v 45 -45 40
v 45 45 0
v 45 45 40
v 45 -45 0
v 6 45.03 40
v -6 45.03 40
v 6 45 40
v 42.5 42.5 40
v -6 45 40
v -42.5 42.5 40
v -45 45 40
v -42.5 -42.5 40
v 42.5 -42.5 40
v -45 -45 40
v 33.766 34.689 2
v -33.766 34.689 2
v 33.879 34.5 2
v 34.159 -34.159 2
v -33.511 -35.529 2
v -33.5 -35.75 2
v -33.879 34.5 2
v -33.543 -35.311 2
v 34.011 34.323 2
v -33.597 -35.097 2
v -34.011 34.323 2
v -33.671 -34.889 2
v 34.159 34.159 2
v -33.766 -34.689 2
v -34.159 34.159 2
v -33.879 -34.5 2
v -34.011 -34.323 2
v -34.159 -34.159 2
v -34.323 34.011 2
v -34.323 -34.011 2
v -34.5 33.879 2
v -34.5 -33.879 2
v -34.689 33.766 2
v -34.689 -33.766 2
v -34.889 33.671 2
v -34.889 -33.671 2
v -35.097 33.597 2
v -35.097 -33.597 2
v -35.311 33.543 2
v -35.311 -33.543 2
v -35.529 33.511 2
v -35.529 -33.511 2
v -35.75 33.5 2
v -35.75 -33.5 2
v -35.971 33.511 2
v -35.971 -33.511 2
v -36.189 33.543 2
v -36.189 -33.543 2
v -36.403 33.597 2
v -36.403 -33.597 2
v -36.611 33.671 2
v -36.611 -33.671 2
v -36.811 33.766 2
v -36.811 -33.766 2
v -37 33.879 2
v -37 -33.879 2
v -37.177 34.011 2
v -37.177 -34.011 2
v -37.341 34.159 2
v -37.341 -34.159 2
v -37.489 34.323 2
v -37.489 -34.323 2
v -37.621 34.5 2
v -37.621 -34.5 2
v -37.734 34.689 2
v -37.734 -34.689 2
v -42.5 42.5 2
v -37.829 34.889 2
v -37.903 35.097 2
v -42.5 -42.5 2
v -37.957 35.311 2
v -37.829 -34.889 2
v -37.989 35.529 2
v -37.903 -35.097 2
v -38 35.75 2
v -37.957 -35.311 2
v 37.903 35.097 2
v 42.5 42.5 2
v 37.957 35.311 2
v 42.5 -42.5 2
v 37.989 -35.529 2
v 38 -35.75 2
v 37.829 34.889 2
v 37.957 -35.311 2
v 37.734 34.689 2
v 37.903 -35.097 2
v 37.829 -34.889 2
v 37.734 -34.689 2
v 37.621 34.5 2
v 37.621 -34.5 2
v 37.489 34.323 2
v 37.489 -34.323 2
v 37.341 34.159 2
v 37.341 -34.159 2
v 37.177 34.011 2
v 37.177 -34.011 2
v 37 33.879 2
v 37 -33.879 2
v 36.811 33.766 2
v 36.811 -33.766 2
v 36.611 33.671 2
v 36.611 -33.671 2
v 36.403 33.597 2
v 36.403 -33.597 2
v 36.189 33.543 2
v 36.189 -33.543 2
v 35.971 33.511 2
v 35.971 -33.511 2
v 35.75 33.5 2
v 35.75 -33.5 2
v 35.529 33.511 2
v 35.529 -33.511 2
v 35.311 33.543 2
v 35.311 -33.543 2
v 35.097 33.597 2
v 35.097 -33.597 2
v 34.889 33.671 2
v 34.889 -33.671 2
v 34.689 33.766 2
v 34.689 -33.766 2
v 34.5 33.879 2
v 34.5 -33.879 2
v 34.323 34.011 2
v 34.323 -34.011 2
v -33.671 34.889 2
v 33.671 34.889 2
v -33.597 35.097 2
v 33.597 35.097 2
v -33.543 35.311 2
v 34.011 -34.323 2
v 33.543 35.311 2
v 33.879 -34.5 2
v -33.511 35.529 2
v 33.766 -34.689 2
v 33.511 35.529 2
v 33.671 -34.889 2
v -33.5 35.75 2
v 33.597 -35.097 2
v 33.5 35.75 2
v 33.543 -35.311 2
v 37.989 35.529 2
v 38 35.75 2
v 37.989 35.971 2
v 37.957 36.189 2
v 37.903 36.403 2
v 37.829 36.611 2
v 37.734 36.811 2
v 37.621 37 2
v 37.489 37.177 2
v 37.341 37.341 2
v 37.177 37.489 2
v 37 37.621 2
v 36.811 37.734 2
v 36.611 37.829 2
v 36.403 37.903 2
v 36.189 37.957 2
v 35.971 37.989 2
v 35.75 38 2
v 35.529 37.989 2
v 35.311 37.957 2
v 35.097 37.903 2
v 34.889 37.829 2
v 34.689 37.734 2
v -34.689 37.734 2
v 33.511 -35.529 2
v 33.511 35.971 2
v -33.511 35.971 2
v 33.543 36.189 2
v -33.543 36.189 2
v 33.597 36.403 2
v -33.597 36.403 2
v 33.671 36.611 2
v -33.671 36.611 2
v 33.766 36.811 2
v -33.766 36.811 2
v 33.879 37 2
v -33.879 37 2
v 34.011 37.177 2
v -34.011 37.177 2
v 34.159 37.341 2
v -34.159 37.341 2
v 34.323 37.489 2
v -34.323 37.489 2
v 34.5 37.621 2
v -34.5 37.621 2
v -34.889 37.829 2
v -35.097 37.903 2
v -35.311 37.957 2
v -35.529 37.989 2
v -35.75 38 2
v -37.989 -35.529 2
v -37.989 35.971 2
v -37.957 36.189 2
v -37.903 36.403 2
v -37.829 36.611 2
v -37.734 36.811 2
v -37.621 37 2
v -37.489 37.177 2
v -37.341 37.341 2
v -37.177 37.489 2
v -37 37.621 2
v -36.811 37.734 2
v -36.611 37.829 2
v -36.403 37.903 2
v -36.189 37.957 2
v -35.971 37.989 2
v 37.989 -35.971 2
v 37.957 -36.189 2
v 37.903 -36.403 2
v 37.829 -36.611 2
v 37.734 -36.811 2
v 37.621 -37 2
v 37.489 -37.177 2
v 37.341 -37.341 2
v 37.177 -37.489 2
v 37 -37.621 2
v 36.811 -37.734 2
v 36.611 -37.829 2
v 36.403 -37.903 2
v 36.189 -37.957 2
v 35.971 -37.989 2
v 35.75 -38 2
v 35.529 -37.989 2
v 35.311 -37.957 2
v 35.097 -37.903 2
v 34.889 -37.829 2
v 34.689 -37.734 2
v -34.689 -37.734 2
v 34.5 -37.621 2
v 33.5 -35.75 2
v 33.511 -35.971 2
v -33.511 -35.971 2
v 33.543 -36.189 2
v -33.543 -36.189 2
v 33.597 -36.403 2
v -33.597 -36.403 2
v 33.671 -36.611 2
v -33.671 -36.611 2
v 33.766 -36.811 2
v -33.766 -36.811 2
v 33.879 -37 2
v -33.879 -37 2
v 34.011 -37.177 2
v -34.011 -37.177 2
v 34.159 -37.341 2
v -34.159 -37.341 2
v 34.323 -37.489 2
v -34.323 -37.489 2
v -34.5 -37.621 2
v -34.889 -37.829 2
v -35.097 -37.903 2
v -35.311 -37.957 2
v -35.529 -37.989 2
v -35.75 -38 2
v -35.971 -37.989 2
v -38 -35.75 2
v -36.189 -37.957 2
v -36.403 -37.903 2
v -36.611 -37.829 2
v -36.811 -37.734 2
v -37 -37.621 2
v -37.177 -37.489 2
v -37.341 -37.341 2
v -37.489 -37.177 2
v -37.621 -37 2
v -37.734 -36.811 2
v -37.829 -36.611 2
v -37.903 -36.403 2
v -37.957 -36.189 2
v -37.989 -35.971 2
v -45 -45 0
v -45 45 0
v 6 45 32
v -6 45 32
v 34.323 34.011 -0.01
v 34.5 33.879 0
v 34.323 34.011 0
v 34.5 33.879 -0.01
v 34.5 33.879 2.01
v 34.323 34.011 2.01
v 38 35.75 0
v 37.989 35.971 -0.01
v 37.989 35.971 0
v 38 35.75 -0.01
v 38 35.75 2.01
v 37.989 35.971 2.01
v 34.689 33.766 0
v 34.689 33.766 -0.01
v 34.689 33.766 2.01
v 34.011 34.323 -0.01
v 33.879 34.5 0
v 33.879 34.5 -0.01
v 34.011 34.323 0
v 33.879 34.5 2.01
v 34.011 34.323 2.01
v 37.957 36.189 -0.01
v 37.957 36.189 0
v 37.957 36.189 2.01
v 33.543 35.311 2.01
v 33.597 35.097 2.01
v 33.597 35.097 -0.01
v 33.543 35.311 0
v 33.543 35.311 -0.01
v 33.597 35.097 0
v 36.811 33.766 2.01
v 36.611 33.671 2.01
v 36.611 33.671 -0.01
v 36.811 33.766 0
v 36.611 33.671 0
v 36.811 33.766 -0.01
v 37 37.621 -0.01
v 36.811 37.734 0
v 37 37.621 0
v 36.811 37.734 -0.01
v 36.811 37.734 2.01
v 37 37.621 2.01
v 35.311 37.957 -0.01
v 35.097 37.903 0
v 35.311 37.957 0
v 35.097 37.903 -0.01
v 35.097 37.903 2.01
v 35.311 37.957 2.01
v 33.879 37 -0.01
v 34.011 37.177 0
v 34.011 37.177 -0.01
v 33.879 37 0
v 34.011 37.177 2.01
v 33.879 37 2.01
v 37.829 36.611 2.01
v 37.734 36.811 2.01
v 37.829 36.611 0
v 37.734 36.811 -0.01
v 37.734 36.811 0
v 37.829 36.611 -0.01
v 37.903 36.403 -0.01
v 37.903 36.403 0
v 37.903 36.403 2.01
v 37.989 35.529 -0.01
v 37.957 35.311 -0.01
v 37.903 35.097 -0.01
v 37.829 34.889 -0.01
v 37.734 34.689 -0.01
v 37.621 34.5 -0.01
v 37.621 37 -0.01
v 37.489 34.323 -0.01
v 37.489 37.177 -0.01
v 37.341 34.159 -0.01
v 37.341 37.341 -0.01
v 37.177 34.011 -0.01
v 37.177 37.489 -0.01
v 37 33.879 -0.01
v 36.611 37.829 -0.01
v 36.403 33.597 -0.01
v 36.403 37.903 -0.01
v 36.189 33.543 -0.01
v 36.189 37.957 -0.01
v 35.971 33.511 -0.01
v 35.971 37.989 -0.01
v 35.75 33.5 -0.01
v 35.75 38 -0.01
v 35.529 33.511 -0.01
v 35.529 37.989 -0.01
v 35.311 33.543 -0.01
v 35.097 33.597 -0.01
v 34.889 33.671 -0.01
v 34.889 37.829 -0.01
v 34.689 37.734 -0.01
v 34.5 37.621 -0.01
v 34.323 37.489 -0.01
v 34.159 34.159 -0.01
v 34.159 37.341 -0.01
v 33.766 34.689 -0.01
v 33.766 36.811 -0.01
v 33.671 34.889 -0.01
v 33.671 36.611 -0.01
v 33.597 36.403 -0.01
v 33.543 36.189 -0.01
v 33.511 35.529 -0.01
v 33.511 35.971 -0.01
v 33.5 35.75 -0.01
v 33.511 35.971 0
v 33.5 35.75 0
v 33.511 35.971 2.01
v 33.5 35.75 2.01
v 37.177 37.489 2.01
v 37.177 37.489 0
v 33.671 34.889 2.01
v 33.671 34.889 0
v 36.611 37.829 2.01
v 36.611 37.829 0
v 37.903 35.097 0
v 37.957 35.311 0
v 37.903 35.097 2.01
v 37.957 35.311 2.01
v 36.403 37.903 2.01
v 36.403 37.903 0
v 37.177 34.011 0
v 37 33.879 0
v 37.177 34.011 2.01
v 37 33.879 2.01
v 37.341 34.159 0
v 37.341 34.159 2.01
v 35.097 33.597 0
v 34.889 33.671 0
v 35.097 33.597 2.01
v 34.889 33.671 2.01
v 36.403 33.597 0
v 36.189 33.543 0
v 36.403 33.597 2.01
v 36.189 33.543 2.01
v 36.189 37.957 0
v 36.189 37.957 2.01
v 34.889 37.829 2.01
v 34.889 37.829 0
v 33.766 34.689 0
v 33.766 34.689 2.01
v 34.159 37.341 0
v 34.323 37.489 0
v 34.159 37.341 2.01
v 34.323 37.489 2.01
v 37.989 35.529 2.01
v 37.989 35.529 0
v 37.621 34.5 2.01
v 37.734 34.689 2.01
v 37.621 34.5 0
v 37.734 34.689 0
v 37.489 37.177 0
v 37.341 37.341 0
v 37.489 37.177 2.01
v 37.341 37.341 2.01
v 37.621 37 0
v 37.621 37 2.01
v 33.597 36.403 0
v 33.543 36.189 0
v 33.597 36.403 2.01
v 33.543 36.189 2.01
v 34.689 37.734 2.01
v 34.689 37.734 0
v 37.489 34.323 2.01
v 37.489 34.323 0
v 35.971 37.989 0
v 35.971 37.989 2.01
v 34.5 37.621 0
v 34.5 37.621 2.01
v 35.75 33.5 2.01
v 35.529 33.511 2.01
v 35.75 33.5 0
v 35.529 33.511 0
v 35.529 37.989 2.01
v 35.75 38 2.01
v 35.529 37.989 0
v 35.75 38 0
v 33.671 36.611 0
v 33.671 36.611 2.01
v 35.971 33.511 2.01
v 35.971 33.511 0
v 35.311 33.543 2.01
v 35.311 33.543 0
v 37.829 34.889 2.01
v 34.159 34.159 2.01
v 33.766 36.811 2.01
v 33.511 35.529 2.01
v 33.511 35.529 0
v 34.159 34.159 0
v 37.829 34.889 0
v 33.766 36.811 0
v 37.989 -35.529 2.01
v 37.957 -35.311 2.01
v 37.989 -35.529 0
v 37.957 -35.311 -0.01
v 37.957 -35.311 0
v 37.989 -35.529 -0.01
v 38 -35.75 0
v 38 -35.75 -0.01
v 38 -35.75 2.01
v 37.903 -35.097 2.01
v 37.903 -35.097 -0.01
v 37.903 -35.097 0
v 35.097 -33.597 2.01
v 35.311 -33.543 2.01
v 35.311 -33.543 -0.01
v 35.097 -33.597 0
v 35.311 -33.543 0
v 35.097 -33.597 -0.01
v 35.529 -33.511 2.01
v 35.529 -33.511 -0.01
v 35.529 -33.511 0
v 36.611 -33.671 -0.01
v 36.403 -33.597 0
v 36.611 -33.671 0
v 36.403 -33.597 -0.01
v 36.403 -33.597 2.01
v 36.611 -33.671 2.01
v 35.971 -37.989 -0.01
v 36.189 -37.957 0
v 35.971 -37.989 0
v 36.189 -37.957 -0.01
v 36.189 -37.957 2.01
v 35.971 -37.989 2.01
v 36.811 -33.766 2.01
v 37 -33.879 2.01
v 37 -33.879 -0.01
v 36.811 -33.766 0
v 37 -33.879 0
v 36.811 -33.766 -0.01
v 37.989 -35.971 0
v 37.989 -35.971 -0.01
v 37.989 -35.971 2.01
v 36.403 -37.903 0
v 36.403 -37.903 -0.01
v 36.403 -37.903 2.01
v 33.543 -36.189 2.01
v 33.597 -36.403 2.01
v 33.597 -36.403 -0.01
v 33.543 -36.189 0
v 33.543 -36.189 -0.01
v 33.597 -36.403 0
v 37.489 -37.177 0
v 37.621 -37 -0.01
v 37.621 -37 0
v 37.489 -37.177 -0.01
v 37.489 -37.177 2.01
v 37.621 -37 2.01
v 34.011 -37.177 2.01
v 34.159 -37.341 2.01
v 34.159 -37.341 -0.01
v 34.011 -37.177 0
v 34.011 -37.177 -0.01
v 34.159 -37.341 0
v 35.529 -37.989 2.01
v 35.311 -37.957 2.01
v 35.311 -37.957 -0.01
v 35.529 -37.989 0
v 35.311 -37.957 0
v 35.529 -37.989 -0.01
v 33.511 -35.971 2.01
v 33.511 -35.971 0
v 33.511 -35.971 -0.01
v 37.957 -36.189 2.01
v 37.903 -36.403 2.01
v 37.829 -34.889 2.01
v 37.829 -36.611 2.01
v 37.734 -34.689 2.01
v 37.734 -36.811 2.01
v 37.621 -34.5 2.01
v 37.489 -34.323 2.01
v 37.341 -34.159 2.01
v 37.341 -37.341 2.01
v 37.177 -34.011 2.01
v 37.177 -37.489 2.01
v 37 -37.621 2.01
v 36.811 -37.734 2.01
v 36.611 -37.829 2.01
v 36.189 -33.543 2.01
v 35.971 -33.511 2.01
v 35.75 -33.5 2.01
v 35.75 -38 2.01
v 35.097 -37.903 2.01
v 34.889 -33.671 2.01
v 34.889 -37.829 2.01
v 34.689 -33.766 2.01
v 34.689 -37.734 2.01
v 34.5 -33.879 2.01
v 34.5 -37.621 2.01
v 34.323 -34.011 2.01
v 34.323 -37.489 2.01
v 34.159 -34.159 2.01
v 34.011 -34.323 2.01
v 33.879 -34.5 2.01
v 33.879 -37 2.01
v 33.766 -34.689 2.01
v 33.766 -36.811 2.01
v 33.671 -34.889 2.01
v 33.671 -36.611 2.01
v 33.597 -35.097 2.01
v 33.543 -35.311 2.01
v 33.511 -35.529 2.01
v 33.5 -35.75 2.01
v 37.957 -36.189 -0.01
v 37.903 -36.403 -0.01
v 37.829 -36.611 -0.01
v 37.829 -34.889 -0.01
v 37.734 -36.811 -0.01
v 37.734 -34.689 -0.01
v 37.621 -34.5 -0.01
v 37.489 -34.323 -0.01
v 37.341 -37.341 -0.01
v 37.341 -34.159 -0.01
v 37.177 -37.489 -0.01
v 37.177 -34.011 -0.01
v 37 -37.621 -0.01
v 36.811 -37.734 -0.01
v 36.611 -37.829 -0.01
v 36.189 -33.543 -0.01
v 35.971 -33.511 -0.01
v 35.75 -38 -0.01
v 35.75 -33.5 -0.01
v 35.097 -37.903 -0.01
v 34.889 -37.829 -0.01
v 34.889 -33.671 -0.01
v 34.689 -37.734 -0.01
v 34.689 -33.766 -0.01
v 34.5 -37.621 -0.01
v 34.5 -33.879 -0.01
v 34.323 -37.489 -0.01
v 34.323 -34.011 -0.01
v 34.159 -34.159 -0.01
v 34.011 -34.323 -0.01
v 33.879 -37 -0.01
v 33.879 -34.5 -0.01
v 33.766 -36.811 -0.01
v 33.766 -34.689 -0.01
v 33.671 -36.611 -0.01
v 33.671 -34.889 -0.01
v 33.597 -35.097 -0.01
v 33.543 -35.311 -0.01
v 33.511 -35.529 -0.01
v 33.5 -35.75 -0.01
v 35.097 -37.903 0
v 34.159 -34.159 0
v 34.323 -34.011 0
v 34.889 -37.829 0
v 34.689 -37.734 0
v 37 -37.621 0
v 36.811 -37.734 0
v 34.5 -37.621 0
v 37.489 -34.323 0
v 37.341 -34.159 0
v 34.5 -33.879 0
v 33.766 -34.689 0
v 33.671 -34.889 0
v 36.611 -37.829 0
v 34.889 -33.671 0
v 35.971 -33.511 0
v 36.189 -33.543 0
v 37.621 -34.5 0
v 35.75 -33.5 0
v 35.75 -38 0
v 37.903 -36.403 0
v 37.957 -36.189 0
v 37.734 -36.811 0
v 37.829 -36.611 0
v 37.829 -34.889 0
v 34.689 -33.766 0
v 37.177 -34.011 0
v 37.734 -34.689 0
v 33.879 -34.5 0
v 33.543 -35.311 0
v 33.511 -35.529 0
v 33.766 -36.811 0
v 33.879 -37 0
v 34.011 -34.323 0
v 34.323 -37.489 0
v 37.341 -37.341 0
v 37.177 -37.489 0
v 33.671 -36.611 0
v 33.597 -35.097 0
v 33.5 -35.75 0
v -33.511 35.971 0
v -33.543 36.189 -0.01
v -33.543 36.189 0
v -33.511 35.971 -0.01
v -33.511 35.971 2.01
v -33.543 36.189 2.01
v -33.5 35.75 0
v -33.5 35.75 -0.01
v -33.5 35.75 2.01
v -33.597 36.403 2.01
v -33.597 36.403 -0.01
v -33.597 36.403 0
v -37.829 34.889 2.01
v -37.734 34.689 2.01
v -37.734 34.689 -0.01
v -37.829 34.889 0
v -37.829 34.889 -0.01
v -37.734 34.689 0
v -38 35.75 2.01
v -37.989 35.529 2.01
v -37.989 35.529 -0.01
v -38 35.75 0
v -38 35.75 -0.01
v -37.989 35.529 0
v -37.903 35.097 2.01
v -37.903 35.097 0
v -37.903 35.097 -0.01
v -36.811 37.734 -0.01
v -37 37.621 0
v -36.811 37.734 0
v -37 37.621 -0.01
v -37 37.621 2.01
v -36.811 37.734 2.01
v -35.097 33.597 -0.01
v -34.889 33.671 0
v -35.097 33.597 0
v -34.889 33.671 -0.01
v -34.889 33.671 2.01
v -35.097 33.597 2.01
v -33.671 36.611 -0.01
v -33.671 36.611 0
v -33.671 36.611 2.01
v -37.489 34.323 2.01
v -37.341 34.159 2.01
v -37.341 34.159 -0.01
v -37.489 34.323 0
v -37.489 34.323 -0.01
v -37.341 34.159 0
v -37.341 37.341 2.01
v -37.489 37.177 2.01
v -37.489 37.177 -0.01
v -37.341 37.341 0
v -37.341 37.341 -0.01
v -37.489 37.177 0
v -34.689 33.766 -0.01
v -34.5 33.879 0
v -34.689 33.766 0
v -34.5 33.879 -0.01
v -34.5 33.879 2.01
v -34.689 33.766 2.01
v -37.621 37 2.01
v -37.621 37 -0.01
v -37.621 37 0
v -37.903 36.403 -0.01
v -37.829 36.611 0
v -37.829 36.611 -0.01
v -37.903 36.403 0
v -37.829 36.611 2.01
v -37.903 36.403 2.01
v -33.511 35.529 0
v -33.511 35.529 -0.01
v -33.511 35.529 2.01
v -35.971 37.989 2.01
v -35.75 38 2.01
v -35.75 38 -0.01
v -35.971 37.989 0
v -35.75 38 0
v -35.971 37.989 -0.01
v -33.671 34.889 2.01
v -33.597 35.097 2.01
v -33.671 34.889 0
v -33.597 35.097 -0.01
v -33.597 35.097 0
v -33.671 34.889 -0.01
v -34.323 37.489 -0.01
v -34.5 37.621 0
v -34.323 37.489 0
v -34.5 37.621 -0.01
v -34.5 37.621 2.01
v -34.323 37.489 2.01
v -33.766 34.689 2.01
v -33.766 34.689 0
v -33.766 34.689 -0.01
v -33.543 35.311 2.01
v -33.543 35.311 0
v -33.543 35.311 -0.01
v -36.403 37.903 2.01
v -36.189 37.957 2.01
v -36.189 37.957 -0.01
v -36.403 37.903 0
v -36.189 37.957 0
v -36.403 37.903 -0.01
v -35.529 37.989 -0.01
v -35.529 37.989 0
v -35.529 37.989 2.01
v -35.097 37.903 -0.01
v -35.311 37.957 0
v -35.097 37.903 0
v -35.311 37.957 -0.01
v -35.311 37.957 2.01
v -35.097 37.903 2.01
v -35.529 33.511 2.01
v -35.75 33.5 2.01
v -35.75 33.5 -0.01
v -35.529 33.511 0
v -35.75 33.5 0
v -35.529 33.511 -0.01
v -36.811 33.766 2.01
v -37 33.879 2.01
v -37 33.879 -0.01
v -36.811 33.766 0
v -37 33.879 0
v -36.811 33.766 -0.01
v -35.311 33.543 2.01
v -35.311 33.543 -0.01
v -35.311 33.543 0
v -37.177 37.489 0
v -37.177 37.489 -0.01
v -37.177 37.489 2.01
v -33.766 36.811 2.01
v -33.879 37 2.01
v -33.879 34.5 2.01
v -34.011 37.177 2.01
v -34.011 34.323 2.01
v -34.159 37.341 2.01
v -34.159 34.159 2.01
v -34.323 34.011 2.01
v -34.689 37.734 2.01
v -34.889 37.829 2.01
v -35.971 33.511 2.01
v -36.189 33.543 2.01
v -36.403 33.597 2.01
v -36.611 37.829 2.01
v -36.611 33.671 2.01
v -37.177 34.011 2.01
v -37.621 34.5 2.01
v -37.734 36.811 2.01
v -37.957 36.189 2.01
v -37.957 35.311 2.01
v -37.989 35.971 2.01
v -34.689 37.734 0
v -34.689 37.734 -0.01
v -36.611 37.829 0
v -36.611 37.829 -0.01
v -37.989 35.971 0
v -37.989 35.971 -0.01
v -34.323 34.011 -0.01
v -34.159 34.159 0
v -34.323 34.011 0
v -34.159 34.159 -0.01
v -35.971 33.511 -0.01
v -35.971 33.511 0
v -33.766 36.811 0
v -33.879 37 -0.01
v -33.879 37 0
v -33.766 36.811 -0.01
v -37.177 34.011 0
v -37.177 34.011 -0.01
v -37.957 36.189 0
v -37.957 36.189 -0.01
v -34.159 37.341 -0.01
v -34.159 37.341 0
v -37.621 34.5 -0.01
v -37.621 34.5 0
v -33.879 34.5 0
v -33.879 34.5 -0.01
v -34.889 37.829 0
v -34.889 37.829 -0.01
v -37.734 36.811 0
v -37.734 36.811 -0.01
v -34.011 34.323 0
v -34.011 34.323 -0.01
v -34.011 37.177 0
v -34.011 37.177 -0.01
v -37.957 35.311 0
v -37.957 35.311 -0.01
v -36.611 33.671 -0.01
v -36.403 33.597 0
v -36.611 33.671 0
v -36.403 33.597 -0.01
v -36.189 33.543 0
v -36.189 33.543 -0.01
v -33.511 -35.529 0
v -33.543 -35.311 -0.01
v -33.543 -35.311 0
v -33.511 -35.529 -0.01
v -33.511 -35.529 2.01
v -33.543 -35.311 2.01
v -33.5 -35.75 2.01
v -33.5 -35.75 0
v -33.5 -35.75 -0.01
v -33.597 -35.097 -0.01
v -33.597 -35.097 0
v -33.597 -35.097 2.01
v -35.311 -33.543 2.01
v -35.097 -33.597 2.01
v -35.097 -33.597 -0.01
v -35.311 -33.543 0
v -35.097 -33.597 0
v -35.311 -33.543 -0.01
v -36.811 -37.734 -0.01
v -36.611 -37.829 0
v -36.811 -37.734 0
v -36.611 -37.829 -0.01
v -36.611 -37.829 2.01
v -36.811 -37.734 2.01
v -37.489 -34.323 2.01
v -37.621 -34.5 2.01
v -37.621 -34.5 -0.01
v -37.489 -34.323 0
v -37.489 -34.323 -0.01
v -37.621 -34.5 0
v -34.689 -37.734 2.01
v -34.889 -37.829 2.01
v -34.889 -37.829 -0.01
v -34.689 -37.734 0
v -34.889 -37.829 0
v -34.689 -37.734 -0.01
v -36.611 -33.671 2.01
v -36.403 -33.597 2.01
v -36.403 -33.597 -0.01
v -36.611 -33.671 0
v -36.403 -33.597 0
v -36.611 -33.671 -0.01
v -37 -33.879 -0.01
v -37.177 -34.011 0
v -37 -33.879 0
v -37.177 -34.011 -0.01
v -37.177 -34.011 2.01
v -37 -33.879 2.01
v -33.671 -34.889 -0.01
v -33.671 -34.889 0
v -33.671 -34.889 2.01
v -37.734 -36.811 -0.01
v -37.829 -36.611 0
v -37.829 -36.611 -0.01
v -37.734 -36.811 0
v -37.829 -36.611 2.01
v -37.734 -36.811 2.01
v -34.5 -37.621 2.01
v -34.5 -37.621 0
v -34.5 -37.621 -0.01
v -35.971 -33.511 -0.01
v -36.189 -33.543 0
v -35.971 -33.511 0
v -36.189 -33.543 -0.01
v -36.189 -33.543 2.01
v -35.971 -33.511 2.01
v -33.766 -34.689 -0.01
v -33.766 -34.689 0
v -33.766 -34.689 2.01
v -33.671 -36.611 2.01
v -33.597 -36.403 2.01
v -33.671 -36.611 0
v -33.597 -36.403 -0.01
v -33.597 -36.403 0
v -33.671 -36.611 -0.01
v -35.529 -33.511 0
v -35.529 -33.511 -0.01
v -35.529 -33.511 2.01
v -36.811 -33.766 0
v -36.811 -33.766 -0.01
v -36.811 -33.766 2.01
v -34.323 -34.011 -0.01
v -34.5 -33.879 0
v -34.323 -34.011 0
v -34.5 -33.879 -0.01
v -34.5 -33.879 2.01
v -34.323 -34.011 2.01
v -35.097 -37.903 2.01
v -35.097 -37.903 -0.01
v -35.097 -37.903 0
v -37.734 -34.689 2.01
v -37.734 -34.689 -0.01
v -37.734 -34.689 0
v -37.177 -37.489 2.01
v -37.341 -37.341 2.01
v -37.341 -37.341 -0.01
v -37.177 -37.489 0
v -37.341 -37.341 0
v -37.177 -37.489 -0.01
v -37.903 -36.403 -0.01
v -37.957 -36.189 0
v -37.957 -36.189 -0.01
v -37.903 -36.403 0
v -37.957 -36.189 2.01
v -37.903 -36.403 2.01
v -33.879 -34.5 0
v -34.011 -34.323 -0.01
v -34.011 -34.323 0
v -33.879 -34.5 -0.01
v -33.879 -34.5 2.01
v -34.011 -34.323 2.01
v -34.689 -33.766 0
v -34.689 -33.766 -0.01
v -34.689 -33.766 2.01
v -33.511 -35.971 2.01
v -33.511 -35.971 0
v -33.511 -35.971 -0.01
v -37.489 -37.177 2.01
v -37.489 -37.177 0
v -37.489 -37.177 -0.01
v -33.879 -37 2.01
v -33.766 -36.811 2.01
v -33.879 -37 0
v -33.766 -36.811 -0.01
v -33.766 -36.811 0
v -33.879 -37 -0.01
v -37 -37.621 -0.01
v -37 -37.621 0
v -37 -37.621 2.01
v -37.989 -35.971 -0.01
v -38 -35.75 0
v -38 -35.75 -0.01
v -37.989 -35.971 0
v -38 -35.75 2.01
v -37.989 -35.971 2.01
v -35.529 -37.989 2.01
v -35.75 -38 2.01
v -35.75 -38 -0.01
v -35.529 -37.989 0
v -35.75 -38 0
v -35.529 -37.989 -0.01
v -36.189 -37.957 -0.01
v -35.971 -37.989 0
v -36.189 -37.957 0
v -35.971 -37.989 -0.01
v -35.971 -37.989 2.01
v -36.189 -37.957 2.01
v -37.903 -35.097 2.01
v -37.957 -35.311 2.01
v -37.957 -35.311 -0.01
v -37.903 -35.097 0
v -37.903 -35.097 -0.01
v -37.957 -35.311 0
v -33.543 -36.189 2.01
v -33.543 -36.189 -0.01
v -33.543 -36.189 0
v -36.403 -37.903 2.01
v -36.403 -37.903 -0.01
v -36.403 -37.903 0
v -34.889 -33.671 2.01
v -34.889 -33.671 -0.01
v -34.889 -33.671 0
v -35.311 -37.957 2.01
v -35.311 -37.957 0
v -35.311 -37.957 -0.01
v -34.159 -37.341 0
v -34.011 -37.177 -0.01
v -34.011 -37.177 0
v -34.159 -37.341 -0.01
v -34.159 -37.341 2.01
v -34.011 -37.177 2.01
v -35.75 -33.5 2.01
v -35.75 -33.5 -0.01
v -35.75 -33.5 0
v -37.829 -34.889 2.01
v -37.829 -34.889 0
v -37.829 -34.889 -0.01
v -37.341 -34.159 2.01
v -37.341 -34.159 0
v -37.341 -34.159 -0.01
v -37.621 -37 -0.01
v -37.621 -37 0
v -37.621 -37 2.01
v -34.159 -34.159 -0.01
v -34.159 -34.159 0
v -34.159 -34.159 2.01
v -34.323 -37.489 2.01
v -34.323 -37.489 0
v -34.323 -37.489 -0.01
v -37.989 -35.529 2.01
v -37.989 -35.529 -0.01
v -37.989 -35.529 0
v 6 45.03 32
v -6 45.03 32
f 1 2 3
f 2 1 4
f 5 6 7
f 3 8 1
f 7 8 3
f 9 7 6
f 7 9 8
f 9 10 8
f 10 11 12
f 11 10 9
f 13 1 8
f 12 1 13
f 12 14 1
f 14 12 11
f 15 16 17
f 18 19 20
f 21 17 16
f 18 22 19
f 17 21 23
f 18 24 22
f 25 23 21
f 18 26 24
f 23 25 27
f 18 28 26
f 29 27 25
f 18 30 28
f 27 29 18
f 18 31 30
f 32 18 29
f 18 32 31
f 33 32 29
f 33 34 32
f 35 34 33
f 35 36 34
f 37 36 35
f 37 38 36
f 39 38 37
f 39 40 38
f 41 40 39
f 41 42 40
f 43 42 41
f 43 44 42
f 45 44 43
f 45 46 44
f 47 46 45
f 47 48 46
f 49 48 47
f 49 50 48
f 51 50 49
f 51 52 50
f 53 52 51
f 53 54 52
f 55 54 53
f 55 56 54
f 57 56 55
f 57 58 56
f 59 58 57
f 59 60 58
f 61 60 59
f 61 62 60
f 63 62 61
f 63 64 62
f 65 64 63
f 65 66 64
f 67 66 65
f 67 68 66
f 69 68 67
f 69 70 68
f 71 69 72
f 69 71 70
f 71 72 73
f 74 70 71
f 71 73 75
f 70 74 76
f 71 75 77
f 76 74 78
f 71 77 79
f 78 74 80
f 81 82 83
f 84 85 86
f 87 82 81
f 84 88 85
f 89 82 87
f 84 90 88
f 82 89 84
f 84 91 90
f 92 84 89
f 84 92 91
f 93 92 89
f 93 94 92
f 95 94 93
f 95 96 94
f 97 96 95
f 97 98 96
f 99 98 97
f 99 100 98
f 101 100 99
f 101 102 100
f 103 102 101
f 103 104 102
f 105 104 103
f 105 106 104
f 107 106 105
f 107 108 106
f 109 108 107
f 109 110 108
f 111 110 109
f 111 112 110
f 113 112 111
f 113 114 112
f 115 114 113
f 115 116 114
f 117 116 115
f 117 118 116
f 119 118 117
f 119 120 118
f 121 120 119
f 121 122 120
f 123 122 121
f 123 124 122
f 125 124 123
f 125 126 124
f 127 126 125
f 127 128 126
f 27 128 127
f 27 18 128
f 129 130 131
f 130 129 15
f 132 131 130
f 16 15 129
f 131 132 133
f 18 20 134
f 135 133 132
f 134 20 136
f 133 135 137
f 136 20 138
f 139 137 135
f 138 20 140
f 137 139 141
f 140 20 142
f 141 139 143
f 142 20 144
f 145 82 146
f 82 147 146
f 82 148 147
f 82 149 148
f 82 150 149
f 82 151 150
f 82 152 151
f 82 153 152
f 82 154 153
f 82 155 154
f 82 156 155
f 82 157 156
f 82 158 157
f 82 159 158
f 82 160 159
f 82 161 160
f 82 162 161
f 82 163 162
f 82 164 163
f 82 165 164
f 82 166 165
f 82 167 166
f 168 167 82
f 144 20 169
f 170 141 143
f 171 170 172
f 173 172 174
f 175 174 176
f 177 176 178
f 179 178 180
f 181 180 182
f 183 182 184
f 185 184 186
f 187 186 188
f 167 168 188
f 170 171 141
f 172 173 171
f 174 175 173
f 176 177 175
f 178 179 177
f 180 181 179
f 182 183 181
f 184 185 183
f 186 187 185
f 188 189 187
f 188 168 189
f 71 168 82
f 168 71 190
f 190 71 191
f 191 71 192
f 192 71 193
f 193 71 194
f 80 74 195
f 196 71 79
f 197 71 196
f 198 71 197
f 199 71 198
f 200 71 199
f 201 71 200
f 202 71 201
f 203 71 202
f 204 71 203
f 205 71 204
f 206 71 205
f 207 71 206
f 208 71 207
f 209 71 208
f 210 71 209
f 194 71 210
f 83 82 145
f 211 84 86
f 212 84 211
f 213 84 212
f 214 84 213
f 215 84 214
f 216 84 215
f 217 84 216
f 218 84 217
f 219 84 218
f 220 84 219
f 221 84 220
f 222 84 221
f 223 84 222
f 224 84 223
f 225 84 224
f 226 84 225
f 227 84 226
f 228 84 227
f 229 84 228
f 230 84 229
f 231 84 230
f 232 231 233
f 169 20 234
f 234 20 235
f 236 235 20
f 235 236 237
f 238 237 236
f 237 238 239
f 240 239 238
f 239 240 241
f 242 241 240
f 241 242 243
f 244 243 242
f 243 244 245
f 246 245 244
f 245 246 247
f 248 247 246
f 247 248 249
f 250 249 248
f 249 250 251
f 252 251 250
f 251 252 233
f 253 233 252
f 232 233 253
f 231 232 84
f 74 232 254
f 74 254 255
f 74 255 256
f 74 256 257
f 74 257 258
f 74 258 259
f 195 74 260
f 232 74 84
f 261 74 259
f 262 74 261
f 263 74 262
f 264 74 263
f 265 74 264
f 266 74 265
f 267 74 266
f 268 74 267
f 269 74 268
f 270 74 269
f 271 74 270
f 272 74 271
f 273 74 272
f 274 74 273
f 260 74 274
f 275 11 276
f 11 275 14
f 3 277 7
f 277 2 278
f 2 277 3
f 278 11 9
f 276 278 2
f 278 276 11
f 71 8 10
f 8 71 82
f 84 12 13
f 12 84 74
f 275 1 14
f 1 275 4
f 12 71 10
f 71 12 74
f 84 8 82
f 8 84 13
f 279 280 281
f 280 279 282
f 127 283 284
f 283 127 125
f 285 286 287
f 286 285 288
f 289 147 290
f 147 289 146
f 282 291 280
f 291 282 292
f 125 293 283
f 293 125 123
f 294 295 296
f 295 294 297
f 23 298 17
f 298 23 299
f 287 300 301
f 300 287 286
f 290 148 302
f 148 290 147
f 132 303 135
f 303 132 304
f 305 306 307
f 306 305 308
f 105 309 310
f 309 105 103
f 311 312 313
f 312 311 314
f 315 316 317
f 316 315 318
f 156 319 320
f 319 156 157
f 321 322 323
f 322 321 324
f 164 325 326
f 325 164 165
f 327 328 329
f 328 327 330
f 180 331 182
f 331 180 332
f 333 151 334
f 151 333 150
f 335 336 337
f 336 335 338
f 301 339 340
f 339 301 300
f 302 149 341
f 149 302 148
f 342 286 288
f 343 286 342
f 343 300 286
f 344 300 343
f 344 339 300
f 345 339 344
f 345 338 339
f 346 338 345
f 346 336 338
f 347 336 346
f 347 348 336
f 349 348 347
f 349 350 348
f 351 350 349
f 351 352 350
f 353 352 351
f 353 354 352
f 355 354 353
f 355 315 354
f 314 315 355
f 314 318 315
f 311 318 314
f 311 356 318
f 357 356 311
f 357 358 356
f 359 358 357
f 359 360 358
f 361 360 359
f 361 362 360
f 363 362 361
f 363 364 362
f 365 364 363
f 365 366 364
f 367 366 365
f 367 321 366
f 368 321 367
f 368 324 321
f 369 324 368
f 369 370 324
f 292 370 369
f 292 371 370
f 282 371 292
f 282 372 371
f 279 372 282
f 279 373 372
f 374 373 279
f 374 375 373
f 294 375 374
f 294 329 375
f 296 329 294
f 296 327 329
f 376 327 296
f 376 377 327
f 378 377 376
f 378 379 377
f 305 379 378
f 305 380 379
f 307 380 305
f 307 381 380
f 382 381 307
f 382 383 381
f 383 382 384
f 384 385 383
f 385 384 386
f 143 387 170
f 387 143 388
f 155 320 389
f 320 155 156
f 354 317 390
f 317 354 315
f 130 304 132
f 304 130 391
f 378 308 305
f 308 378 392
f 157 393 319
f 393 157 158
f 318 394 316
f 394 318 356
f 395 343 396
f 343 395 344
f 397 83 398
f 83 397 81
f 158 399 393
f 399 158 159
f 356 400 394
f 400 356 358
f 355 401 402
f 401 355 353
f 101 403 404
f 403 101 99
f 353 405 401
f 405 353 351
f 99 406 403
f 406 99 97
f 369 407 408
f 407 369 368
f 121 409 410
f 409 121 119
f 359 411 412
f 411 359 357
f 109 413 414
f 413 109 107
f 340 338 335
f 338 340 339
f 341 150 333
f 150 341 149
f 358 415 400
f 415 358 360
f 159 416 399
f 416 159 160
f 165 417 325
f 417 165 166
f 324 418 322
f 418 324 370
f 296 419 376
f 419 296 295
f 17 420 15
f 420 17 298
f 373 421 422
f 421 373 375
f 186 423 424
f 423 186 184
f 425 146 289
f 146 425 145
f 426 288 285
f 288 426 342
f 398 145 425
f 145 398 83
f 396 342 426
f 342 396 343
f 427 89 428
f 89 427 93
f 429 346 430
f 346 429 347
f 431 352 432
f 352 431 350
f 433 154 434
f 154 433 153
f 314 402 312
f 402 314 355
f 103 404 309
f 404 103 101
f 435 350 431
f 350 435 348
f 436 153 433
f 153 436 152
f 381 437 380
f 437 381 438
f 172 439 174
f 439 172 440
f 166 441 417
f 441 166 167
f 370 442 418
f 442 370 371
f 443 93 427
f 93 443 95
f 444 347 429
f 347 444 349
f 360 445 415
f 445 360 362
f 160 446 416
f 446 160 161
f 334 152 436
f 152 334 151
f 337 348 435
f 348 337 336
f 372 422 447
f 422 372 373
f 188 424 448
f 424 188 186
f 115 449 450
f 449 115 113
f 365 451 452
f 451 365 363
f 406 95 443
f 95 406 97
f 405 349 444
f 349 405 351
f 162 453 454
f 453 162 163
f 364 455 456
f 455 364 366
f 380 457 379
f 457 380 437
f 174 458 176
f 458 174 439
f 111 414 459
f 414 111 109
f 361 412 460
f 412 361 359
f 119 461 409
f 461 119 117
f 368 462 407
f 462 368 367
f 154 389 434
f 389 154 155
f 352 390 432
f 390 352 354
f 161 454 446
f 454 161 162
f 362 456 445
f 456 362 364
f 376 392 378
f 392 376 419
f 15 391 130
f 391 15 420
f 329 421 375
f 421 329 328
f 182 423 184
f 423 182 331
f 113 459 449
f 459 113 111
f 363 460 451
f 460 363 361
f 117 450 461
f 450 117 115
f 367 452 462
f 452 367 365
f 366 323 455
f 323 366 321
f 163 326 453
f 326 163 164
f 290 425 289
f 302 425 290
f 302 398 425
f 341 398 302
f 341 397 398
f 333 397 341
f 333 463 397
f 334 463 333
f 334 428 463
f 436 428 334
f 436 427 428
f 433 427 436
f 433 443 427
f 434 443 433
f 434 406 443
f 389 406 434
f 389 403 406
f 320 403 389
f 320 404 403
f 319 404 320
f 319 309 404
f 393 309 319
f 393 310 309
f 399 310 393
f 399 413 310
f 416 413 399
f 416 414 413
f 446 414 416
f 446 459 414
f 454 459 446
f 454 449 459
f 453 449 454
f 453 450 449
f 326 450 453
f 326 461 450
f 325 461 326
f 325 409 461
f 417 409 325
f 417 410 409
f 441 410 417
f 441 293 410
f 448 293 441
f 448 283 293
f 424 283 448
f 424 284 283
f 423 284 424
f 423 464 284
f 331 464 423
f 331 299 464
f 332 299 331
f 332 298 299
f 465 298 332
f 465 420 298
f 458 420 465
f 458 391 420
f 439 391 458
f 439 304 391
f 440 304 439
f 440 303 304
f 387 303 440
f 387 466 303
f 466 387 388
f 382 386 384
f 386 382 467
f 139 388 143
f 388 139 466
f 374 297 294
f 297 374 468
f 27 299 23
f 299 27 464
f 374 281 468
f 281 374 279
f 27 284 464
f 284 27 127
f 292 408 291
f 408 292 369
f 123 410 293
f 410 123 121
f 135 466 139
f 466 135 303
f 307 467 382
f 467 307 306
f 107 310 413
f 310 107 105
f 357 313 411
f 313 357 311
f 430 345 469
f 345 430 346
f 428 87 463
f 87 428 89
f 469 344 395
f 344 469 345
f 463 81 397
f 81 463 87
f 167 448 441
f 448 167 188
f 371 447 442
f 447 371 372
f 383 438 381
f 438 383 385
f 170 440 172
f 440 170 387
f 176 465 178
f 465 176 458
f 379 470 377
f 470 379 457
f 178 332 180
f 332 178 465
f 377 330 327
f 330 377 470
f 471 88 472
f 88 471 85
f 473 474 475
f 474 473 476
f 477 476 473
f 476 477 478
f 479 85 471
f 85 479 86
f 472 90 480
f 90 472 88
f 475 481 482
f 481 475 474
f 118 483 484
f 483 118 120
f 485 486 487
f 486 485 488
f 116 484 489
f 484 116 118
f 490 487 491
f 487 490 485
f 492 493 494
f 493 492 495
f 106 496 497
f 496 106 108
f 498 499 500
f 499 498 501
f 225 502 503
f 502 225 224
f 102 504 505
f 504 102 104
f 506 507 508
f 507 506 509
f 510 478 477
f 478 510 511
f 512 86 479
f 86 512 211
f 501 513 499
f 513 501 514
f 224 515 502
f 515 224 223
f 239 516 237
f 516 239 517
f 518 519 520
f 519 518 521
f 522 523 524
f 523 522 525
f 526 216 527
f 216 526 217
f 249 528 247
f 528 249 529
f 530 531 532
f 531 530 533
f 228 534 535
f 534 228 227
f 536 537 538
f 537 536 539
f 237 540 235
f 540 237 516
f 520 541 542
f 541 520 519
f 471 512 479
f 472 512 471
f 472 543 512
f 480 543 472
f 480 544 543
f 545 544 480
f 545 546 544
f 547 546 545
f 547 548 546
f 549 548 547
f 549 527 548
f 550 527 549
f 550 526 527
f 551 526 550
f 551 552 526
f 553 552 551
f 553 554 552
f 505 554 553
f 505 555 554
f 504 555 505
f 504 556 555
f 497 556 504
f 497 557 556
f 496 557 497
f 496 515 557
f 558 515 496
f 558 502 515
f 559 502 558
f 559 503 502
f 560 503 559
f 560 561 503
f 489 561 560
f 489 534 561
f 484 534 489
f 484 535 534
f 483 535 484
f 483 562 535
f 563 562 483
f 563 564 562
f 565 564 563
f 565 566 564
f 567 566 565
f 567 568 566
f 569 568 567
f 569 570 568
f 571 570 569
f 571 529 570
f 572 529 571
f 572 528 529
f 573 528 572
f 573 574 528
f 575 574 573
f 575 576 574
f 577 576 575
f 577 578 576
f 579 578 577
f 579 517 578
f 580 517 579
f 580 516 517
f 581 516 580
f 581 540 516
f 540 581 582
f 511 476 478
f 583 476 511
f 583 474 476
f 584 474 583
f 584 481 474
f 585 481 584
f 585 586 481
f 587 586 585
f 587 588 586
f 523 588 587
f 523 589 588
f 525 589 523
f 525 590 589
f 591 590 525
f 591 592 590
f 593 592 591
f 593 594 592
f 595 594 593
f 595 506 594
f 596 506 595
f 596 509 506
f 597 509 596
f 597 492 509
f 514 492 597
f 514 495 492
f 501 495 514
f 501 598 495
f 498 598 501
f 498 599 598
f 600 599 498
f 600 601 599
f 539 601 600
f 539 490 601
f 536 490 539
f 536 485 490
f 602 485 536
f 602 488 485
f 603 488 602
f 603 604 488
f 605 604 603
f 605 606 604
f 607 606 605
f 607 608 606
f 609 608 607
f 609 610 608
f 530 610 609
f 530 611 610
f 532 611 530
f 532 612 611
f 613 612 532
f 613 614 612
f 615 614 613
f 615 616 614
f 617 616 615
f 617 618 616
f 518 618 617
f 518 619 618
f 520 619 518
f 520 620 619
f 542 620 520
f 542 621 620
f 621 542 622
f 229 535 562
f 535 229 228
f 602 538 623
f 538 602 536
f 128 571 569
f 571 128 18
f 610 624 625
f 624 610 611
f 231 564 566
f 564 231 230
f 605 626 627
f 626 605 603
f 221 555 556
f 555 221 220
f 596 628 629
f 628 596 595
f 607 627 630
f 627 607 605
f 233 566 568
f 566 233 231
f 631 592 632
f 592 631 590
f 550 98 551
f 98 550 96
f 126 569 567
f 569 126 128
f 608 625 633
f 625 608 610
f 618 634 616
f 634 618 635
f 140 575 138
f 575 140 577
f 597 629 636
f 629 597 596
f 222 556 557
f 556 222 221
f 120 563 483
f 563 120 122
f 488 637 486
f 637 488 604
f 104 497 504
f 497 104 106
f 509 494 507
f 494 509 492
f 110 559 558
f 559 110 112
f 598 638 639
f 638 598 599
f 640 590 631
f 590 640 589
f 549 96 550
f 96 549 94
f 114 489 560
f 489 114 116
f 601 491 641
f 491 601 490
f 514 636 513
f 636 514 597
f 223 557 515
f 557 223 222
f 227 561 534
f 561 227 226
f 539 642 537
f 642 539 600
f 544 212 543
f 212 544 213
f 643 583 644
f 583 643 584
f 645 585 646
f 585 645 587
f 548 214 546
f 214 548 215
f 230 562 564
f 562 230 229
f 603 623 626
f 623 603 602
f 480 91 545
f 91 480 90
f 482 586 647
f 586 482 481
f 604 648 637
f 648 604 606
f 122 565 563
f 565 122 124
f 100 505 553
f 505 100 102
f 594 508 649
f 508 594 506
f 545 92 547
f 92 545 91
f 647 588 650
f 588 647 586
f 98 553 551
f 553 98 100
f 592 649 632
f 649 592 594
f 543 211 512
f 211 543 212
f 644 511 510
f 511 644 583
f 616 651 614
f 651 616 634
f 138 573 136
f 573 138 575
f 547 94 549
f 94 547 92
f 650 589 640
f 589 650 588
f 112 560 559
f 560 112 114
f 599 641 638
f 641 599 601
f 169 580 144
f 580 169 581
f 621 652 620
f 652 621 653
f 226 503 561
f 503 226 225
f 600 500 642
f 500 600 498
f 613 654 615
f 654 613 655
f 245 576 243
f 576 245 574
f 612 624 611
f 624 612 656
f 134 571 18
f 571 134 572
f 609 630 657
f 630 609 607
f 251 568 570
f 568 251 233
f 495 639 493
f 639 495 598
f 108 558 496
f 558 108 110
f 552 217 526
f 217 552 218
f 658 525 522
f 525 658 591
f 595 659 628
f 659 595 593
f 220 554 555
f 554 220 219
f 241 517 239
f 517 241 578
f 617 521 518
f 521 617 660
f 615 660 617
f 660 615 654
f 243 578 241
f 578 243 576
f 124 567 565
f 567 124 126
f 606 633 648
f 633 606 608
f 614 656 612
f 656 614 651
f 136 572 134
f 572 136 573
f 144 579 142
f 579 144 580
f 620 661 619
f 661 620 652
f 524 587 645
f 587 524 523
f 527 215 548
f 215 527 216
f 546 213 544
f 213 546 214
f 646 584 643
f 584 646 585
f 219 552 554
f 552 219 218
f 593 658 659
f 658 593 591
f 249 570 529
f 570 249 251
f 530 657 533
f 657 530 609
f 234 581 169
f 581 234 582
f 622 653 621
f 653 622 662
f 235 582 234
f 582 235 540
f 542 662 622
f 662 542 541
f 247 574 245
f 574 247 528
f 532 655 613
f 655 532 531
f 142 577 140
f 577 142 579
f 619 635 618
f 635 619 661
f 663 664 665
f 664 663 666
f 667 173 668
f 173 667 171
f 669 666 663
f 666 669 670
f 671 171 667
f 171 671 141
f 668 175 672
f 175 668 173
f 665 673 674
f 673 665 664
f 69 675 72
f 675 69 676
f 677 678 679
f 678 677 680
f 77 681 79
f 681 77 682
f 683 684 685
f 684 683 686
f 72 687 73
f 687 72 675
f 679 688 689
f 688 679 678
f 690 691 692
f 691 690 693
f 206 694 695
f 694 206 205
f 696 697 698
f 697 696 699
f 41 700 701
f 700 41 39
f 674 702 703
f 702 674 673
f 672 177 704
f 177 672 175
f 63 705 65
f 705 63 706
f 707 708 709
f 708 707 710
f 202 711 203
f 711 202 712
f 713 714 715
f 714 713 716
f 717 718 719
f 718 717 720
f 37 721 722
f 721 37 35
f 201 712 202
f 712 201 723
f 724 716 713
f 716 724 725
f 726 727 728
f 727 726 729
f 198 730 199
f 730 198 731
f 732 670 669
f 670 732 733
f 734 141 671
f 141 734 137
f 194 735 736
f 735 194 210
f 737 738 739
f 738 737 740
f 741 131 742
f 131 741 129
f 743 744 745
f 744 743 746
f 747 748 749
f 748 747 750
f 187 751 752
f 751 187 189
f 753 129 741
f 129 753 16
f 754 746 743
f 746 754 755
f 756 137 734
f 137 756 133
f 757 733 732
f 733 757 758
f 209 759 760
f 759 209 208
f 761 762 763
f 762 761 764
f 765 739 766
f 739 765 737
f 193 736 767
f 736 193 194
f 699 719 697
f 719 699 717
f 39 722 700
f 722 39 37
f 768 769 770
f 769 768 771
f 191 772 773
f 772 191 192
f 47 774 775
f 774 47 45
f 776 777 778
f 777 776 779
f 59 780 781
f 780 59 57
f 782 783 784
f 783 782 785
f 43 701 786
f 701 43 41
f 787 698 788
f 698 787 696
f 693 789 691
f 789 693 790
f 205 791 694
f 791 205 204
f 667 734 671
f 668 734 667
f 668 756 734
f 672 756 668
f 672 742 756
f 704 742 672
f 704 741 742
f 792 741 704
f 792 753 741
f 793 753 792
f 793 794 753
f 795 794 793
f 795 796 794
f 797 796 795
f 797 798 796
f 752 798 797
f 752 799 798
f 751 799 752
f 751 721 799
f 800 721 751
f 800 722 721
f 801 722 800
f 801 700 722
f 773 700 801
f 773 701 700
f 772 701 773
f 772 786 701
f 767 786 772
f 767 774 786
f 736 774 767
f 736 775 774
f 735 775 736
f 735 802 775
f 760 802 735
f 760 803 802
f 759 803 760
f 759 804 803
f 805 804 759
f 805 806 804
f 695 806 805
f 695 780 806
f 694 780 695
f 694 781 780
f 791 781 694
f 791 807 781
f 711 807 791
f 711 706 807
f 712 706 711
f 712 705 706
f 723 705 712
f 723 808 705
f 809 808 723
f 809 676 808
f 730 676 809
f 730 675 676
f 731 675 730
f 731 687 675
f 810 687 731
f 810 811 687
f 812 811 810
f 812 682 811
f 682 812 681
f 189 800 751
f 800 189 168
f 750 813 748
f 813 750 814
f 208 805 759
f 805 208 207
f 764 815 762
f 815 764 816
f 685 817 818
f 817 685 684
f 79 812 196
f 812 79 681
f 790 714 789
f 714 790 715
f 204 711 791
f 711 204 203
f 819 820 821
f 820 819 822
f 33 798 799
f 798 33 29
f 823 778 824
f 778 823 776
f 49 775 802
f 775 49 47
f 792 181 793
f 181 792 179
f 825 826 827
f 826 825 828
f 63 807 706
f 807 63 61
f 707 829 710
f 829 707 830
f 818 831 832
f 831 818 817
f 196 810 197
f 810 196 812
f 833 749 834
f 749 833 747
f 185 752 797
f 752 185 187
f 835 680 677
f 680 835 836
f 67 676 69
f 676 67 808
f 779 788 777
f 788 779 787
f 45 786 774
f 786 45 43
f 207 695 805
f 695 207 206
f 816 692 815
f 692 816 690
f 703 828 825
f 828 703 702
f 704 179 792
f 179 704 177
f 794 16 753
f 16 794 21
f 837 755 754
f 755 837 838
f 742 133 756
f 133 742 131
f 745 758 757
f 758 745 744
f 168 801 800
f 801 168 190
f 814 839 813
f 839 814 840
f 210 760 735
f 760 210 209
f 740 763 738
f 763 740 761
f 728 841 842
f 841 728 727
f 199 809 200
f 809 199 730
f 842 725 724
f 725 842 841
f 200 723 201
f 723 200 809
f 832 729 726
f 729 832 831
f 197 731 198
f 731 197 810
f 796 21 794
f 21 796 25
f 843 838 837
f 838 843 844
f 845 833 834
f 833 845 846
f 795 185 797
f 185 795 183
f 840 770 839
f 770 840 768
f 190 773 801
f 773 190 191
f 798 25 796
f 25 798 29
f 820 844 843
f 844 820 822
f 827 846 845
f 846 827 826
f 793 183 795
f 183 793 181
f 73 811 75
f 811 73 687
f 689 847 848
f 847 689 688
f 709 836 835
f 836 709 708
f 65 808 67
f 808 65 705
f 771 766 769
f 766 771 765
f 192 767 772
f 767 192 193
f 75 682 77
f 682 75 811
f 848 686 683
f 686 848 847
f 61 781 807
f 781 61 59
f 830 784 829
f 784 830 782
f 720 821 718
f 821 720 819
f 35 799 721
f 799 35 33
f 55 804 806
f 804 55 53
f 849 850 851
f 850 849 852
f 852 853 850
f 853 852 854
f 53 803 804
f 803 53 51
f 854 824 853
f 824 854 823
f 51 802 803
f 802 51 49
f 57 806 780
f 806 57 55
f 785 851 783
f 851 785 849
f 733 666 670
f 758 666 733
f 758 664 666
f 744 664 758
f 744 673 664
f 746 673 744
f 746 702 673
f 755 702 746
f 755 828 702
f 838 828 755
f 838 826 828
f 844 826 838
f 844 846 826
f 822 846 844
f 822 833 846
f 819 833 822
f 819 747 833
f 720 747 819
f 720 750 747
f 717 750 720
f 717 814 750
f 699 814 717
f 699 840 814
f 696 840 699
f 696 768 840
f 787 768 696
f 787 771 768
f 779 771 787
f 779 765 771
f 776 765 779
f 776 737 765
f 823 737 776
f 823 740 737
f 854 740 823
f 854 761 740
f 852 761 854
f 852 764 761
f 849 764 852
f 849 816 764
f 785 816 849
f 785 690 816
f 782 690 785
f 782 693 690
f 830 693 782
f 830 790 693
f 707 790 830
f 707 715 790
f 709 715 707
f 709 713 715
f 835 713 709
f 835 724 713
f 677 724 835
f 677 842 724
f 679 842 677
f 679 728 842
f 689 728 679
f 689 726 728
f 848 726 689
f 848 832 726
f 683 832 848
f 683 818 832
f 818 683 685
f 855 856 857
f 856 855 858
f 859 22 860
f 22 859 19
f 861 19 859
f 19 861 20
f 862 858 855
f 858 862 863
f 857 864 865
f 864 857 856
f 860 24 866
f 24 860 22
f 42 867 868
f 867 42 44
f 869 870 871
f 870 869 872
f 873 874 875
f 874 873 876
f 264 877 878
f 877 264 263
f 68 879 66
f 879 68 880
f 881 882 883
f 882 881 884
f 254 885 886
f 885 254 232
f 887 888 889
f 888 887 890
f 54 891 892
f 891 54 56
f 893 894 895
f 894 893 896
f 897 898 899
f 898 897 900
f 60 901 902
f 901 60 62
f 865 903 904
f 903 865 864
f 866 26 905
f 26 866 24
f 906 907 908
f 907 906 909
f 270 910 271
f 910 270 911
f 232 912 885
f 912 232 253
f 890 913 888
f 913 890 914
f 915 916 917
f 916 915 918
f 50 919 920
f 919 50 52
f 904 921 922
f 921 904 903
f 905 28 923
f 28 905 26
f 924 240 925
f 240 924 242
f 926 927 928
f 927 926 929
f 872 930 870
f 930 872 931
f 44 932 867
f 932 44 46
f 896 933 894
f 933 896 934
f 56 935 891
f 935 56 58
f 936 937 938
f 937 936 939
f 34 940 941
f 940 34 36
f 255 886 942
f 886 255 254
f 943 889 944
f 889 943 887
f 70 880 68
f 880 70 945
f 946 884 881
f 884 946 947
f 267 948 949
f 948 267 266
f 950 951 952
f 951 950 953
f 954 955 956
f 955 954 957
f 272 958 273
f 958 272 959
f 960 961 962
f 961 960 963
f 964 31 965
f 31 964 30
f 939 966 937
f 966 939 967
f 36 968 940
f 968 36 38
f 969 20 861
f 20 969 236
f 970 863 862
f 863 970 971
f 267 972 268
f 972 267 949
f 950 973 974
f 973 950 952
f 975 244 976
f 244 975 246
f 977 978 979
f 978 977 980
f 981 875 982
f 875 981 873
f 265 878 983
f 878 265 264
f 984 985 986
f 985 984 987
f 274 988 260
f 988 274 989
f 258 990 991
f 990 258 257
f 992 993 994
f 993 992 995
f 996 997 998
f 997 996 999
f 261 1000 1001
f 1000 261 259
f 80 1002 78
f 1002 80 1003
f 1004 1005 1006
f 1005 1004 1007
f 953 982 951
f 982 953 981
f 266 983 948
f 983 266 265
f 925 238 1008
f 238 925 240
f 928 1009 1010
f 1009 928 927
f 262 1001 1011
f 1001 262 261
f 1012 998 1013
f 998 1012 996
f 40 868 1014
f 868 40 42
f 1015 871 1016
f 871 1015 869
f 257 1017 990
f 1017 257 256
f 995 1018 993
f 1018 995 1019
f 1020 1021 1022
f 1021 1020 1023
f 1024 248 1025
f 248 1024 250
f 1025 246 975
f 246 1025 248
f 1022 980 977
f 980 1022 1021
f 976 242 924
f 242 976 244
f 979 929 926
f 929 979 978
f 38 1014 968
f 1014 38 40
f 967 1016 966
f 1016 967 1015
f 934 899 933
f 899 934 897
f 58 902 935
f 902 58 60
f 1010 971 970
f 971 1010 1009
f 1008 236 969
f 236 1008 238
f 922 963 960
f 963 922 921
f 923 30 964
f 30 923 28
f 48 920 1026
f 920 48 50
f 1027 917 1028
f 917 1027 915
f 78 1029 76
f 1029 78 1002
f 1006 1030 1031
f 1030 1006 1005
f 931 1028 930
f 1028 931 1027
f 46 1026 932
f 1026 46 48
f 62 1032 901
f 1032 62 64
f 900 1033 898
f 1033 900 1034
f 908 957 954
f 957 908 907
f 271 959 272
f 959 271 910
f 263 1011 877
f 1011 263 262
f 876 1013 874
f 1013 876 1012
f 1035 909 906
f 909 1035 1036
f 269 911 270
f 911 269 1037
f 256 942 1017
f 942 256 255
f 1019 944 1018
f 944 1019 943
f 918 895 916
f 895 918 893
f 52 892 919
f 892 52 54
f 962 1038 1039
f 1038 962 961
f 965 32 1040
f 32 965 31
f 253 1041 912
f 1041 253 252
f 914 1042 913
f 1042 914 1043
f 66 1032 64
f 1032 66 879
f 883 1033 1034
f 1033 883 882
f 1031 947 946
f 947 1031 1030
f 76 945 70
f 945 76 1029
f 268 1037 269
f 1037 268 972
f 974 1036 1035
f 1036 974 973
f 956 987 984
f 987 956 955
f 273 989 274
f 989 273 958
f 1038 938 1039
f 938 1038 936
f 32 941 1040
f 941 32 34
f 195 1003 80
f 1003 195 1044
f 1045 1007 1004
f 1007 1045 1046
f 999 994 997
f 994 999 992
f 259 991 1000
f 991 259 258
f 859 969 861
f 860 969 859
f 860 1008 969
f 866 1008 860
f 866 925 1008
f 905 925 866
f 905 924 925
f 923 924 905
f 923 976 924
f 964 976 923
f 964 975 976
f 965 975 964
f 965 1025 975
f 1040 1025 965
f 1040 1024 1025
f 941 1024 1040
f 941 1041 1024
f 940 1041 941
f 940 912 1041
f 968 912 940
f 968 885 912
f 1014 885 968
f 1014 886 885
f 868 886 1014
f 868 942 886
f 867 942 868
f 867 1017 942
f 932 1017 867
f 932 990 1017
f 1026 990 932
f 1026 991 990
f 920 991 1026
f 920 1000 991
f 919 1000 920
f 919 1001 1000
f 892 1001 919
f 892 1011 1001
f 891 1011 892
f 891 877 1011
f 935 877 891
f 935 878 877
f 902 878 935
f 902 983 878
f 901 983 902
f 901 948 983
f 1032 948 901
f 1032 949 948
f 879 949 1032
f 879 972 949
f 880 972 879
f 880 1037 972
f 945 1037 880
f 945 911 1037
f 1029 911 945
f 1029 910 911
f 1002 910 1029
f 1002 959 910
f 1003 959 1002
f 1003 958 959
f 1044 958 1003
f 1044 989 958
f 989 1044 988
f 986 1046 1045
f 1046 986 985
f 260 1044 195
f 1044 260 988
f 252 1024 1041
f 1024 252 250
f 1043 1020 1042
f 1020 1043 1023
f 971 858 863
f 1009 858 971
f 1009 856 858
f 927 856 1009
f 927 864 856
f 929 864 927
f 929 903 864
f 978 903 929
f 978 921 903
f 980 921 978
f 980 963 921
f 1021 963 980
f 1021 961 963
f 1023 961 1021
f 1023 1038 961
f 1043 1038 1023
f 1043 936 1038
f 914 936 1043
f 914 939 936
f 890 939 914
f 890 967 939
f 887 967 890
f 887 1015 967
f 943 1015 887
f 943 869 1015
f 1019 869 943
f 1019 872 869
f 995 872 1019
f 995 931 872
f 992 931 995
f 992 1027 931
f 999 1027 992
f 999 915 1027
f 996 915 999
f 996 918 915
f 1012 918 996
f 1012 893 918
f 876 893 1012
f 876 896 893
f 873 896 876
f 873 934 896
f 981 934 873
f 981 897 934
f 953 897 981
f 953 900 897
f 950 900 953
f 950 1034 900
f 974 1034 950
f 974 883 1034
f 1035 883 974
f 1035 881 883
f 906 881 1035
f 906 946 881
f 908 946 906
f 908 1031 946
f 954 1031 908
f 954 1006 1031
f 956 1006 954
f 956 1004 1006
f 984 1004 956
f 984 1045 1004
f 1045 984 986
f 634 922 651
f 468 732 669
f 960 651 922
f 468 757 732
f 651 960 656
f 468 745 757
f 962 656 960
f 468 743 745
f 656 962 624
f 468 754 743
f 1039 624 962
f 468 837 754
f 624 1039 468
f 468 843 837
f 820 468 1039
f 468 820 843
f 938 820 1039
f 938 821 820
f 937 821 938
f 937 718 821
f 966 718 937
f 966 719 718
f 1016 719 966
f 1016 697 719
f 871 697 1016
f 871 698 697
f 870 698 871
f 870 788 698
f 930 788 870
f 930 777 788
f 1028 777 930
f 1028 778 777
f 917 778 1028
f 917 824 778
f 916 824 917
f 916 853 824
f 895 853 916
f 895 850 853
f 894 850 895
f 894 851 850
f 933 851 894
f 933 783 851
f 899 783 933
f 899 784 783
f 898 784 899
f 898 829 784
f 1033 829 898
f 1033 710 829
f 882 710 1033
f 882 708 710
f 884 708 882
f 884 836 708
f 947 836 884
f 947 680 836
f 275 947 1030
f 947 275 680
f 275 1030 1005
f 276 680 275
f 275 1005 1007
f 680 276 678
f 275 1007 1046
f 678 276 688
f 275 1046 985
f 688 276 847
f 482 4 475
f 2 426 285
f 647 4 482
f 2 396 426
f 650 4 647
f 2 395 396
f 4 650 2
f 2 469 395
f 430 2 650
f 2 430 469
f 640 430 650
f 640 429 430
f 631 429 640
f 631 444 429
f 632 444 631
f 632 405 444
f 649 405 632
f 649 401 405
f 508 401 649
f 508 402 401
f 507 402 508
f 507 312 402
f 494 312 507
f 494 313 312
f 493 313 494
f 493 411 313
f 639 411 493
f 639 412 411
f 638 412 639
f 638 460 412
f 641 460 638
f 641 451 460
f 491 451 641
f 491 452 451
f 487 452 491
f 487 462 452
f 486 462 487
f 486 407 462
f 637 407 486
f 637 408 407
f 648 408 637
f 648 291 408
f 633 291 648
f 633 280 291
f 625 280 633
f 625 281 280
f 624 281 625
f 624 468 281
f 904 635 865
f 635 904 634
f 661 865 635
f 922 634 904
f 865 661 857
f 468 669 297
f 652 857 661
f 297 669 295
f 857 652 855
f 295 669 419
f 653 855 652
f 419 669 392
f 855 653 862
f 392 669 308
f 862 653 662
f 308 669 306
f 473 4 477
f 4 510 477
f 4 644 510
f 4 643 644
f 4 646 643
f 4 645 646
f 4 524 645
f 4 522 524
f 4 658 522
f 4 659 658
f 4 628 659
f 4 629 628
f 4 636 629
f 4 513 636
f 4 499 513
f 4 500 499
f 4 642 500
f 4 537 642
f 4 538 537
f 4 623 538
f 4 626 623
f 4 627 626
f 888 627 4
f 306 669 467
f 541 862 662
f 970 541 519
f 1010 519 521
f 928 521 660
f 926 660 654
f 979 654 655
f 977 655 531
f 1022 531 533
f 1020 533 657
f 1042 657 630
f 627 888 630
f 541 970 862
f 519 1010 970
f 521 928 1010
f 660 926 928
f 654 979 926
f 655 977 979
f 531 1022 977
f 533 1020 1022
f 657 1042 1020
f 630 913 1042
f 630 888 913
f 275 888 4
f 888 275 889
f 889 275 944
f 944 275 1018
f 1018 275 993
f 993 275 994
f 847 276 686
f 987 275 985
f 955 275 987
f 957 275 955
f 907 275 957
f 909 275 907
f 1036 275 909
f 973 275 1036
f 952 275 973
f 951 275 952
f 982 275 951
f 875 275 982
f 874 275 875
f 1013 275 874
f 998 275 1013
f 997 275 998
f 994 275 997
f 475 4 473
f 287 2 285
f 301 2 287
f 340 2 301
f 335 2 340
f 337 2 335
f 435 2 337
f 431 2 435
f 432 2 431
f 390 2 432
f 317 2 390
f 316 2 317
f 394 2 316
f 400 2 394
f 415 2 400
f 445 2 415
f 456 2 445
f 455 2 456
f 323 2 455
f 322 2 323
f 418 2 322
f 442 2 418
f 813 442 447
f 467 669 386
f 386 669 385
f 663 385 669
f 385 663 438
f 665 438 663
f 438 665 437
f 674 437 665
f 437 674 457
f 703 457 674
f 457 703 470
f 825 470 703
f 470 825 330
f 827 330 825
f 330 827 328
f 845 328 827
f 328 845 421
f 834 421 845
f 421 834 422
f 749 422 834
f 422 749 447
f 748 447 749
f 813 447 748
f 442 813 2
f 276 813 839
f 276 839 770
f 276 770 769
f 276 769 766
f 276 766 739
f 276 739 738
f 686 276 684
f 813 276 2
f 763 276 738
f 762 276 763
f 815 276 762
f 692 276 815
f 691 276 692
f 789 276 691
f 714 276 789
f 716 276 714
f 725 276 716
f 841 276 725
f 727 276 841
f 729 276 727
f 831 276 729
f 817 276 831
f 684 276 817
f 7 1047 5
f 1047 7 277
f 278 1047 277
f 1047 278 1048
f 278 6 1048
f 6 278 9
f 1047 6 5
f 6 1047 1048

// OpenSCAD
// DIY Magnetic Stirrer Housing
// Dimensions in mm

// Parameters
outer_size = 90;           // Outer X/Y size of the housing
wall_thickness = 2.5;      // Wall thickness
top_thickness = 2;         // Top plate thickness
height = 40;               // Total height (from top plate to open top)
hole_pattern = 71.5;       // Screw hole pattern square size
hole_diameter = 4.5;       // Screw hole diameter
notch_width = 12;          // Power cable notch width
notch_depth = 8;           // Notch depth from top (40 - 32 = 8)
notch_height_start = 32;   // Notch starts at z = 32

// Set resolution for curves
$fn = 64;

// Calculate inner dimensions
inner_size = outer_size - 2 * wall_thickness;

// Base plate (top plate in use, printed flat at z=0)
module base_plate() {
    translate([-(outer_size/2), -(outer_size/2), 0]) {
        cube([outer_size, outer_size, top_thickness]);
    }
}

// Walls
module walls() {
    // Front wall (Y+ side)
    translate([-(outer_size/2), (outer_size/2) - wall_thickness, top_thickness]) {
        cube([outer_size, wall_thickness, height - top_thickness]);
    }
    
    // Back wall (Y- side)
    translate([-(outer_size/2), -(outer_size/2), top_thickness]) {
        cube([outer_size, wall_thickness, height - top_thickness]);
    }
    
    // Left wall (X- side)
    translate([-(outer_size/2), -(outer_size/2), top_thickness]) {
        cube([wall_thickness, outer_size, height - top_thickness]);
    }
    
    // Right wall (X+ side)
    translate([(outer_size/2) - wall_thickness, -(outer_size/2), top_thickness]) {
        cube([wall_thickness, outer_size, height - top_thickness]);
    }
}

// Screw holes (4.5mm for M4 screws) - only through top plate
module screw_holes() {
    half_pattern = hole_pattern / 2;
    hole_radius = hole_diameter / 2;
    
    // Positions of the four holes relative to center
    positions = [
        [half_pattern, half_pattern],
        [half_pattern, -half_pattern],
        [-half_pattern, half_pattern],
        [-half_pattern, -half_pattern]
    ];
    
    for (i = [0:3]) {
        translate([positions[i][0], positions[i][1], -0.01]) {
            cylinder(h = top_thickness + 0.02, r = hole_radius);
        }
    }
}

// Power cable notch - only in front wall
module notch() {
    // Notch in the front wall (Y+ side)
    // Centered along the wall (X direction), 12mm wide
    // Extends from z = 32 to z = 40 (height - notch_depth to height)
    translate([-(notch_width/2), (outer_size/2) - wall_thickness + 0.01, notch_height_start]) {
        cube([notch_width, wall_thickness + 0.02, height - notch_height_start]);
    }
}

// Assemble the housing
module housing() {
    union() {
        // Base plate
        base_plate();
        
        // Walls
        walls();
        
        // Subtract screw holes (only through top plate)
        translate([0, 0, 0]) {
            screw_holes();
        }
        
        // Subtract notch
        notch();
    }
}

// Build the housing
housing();
